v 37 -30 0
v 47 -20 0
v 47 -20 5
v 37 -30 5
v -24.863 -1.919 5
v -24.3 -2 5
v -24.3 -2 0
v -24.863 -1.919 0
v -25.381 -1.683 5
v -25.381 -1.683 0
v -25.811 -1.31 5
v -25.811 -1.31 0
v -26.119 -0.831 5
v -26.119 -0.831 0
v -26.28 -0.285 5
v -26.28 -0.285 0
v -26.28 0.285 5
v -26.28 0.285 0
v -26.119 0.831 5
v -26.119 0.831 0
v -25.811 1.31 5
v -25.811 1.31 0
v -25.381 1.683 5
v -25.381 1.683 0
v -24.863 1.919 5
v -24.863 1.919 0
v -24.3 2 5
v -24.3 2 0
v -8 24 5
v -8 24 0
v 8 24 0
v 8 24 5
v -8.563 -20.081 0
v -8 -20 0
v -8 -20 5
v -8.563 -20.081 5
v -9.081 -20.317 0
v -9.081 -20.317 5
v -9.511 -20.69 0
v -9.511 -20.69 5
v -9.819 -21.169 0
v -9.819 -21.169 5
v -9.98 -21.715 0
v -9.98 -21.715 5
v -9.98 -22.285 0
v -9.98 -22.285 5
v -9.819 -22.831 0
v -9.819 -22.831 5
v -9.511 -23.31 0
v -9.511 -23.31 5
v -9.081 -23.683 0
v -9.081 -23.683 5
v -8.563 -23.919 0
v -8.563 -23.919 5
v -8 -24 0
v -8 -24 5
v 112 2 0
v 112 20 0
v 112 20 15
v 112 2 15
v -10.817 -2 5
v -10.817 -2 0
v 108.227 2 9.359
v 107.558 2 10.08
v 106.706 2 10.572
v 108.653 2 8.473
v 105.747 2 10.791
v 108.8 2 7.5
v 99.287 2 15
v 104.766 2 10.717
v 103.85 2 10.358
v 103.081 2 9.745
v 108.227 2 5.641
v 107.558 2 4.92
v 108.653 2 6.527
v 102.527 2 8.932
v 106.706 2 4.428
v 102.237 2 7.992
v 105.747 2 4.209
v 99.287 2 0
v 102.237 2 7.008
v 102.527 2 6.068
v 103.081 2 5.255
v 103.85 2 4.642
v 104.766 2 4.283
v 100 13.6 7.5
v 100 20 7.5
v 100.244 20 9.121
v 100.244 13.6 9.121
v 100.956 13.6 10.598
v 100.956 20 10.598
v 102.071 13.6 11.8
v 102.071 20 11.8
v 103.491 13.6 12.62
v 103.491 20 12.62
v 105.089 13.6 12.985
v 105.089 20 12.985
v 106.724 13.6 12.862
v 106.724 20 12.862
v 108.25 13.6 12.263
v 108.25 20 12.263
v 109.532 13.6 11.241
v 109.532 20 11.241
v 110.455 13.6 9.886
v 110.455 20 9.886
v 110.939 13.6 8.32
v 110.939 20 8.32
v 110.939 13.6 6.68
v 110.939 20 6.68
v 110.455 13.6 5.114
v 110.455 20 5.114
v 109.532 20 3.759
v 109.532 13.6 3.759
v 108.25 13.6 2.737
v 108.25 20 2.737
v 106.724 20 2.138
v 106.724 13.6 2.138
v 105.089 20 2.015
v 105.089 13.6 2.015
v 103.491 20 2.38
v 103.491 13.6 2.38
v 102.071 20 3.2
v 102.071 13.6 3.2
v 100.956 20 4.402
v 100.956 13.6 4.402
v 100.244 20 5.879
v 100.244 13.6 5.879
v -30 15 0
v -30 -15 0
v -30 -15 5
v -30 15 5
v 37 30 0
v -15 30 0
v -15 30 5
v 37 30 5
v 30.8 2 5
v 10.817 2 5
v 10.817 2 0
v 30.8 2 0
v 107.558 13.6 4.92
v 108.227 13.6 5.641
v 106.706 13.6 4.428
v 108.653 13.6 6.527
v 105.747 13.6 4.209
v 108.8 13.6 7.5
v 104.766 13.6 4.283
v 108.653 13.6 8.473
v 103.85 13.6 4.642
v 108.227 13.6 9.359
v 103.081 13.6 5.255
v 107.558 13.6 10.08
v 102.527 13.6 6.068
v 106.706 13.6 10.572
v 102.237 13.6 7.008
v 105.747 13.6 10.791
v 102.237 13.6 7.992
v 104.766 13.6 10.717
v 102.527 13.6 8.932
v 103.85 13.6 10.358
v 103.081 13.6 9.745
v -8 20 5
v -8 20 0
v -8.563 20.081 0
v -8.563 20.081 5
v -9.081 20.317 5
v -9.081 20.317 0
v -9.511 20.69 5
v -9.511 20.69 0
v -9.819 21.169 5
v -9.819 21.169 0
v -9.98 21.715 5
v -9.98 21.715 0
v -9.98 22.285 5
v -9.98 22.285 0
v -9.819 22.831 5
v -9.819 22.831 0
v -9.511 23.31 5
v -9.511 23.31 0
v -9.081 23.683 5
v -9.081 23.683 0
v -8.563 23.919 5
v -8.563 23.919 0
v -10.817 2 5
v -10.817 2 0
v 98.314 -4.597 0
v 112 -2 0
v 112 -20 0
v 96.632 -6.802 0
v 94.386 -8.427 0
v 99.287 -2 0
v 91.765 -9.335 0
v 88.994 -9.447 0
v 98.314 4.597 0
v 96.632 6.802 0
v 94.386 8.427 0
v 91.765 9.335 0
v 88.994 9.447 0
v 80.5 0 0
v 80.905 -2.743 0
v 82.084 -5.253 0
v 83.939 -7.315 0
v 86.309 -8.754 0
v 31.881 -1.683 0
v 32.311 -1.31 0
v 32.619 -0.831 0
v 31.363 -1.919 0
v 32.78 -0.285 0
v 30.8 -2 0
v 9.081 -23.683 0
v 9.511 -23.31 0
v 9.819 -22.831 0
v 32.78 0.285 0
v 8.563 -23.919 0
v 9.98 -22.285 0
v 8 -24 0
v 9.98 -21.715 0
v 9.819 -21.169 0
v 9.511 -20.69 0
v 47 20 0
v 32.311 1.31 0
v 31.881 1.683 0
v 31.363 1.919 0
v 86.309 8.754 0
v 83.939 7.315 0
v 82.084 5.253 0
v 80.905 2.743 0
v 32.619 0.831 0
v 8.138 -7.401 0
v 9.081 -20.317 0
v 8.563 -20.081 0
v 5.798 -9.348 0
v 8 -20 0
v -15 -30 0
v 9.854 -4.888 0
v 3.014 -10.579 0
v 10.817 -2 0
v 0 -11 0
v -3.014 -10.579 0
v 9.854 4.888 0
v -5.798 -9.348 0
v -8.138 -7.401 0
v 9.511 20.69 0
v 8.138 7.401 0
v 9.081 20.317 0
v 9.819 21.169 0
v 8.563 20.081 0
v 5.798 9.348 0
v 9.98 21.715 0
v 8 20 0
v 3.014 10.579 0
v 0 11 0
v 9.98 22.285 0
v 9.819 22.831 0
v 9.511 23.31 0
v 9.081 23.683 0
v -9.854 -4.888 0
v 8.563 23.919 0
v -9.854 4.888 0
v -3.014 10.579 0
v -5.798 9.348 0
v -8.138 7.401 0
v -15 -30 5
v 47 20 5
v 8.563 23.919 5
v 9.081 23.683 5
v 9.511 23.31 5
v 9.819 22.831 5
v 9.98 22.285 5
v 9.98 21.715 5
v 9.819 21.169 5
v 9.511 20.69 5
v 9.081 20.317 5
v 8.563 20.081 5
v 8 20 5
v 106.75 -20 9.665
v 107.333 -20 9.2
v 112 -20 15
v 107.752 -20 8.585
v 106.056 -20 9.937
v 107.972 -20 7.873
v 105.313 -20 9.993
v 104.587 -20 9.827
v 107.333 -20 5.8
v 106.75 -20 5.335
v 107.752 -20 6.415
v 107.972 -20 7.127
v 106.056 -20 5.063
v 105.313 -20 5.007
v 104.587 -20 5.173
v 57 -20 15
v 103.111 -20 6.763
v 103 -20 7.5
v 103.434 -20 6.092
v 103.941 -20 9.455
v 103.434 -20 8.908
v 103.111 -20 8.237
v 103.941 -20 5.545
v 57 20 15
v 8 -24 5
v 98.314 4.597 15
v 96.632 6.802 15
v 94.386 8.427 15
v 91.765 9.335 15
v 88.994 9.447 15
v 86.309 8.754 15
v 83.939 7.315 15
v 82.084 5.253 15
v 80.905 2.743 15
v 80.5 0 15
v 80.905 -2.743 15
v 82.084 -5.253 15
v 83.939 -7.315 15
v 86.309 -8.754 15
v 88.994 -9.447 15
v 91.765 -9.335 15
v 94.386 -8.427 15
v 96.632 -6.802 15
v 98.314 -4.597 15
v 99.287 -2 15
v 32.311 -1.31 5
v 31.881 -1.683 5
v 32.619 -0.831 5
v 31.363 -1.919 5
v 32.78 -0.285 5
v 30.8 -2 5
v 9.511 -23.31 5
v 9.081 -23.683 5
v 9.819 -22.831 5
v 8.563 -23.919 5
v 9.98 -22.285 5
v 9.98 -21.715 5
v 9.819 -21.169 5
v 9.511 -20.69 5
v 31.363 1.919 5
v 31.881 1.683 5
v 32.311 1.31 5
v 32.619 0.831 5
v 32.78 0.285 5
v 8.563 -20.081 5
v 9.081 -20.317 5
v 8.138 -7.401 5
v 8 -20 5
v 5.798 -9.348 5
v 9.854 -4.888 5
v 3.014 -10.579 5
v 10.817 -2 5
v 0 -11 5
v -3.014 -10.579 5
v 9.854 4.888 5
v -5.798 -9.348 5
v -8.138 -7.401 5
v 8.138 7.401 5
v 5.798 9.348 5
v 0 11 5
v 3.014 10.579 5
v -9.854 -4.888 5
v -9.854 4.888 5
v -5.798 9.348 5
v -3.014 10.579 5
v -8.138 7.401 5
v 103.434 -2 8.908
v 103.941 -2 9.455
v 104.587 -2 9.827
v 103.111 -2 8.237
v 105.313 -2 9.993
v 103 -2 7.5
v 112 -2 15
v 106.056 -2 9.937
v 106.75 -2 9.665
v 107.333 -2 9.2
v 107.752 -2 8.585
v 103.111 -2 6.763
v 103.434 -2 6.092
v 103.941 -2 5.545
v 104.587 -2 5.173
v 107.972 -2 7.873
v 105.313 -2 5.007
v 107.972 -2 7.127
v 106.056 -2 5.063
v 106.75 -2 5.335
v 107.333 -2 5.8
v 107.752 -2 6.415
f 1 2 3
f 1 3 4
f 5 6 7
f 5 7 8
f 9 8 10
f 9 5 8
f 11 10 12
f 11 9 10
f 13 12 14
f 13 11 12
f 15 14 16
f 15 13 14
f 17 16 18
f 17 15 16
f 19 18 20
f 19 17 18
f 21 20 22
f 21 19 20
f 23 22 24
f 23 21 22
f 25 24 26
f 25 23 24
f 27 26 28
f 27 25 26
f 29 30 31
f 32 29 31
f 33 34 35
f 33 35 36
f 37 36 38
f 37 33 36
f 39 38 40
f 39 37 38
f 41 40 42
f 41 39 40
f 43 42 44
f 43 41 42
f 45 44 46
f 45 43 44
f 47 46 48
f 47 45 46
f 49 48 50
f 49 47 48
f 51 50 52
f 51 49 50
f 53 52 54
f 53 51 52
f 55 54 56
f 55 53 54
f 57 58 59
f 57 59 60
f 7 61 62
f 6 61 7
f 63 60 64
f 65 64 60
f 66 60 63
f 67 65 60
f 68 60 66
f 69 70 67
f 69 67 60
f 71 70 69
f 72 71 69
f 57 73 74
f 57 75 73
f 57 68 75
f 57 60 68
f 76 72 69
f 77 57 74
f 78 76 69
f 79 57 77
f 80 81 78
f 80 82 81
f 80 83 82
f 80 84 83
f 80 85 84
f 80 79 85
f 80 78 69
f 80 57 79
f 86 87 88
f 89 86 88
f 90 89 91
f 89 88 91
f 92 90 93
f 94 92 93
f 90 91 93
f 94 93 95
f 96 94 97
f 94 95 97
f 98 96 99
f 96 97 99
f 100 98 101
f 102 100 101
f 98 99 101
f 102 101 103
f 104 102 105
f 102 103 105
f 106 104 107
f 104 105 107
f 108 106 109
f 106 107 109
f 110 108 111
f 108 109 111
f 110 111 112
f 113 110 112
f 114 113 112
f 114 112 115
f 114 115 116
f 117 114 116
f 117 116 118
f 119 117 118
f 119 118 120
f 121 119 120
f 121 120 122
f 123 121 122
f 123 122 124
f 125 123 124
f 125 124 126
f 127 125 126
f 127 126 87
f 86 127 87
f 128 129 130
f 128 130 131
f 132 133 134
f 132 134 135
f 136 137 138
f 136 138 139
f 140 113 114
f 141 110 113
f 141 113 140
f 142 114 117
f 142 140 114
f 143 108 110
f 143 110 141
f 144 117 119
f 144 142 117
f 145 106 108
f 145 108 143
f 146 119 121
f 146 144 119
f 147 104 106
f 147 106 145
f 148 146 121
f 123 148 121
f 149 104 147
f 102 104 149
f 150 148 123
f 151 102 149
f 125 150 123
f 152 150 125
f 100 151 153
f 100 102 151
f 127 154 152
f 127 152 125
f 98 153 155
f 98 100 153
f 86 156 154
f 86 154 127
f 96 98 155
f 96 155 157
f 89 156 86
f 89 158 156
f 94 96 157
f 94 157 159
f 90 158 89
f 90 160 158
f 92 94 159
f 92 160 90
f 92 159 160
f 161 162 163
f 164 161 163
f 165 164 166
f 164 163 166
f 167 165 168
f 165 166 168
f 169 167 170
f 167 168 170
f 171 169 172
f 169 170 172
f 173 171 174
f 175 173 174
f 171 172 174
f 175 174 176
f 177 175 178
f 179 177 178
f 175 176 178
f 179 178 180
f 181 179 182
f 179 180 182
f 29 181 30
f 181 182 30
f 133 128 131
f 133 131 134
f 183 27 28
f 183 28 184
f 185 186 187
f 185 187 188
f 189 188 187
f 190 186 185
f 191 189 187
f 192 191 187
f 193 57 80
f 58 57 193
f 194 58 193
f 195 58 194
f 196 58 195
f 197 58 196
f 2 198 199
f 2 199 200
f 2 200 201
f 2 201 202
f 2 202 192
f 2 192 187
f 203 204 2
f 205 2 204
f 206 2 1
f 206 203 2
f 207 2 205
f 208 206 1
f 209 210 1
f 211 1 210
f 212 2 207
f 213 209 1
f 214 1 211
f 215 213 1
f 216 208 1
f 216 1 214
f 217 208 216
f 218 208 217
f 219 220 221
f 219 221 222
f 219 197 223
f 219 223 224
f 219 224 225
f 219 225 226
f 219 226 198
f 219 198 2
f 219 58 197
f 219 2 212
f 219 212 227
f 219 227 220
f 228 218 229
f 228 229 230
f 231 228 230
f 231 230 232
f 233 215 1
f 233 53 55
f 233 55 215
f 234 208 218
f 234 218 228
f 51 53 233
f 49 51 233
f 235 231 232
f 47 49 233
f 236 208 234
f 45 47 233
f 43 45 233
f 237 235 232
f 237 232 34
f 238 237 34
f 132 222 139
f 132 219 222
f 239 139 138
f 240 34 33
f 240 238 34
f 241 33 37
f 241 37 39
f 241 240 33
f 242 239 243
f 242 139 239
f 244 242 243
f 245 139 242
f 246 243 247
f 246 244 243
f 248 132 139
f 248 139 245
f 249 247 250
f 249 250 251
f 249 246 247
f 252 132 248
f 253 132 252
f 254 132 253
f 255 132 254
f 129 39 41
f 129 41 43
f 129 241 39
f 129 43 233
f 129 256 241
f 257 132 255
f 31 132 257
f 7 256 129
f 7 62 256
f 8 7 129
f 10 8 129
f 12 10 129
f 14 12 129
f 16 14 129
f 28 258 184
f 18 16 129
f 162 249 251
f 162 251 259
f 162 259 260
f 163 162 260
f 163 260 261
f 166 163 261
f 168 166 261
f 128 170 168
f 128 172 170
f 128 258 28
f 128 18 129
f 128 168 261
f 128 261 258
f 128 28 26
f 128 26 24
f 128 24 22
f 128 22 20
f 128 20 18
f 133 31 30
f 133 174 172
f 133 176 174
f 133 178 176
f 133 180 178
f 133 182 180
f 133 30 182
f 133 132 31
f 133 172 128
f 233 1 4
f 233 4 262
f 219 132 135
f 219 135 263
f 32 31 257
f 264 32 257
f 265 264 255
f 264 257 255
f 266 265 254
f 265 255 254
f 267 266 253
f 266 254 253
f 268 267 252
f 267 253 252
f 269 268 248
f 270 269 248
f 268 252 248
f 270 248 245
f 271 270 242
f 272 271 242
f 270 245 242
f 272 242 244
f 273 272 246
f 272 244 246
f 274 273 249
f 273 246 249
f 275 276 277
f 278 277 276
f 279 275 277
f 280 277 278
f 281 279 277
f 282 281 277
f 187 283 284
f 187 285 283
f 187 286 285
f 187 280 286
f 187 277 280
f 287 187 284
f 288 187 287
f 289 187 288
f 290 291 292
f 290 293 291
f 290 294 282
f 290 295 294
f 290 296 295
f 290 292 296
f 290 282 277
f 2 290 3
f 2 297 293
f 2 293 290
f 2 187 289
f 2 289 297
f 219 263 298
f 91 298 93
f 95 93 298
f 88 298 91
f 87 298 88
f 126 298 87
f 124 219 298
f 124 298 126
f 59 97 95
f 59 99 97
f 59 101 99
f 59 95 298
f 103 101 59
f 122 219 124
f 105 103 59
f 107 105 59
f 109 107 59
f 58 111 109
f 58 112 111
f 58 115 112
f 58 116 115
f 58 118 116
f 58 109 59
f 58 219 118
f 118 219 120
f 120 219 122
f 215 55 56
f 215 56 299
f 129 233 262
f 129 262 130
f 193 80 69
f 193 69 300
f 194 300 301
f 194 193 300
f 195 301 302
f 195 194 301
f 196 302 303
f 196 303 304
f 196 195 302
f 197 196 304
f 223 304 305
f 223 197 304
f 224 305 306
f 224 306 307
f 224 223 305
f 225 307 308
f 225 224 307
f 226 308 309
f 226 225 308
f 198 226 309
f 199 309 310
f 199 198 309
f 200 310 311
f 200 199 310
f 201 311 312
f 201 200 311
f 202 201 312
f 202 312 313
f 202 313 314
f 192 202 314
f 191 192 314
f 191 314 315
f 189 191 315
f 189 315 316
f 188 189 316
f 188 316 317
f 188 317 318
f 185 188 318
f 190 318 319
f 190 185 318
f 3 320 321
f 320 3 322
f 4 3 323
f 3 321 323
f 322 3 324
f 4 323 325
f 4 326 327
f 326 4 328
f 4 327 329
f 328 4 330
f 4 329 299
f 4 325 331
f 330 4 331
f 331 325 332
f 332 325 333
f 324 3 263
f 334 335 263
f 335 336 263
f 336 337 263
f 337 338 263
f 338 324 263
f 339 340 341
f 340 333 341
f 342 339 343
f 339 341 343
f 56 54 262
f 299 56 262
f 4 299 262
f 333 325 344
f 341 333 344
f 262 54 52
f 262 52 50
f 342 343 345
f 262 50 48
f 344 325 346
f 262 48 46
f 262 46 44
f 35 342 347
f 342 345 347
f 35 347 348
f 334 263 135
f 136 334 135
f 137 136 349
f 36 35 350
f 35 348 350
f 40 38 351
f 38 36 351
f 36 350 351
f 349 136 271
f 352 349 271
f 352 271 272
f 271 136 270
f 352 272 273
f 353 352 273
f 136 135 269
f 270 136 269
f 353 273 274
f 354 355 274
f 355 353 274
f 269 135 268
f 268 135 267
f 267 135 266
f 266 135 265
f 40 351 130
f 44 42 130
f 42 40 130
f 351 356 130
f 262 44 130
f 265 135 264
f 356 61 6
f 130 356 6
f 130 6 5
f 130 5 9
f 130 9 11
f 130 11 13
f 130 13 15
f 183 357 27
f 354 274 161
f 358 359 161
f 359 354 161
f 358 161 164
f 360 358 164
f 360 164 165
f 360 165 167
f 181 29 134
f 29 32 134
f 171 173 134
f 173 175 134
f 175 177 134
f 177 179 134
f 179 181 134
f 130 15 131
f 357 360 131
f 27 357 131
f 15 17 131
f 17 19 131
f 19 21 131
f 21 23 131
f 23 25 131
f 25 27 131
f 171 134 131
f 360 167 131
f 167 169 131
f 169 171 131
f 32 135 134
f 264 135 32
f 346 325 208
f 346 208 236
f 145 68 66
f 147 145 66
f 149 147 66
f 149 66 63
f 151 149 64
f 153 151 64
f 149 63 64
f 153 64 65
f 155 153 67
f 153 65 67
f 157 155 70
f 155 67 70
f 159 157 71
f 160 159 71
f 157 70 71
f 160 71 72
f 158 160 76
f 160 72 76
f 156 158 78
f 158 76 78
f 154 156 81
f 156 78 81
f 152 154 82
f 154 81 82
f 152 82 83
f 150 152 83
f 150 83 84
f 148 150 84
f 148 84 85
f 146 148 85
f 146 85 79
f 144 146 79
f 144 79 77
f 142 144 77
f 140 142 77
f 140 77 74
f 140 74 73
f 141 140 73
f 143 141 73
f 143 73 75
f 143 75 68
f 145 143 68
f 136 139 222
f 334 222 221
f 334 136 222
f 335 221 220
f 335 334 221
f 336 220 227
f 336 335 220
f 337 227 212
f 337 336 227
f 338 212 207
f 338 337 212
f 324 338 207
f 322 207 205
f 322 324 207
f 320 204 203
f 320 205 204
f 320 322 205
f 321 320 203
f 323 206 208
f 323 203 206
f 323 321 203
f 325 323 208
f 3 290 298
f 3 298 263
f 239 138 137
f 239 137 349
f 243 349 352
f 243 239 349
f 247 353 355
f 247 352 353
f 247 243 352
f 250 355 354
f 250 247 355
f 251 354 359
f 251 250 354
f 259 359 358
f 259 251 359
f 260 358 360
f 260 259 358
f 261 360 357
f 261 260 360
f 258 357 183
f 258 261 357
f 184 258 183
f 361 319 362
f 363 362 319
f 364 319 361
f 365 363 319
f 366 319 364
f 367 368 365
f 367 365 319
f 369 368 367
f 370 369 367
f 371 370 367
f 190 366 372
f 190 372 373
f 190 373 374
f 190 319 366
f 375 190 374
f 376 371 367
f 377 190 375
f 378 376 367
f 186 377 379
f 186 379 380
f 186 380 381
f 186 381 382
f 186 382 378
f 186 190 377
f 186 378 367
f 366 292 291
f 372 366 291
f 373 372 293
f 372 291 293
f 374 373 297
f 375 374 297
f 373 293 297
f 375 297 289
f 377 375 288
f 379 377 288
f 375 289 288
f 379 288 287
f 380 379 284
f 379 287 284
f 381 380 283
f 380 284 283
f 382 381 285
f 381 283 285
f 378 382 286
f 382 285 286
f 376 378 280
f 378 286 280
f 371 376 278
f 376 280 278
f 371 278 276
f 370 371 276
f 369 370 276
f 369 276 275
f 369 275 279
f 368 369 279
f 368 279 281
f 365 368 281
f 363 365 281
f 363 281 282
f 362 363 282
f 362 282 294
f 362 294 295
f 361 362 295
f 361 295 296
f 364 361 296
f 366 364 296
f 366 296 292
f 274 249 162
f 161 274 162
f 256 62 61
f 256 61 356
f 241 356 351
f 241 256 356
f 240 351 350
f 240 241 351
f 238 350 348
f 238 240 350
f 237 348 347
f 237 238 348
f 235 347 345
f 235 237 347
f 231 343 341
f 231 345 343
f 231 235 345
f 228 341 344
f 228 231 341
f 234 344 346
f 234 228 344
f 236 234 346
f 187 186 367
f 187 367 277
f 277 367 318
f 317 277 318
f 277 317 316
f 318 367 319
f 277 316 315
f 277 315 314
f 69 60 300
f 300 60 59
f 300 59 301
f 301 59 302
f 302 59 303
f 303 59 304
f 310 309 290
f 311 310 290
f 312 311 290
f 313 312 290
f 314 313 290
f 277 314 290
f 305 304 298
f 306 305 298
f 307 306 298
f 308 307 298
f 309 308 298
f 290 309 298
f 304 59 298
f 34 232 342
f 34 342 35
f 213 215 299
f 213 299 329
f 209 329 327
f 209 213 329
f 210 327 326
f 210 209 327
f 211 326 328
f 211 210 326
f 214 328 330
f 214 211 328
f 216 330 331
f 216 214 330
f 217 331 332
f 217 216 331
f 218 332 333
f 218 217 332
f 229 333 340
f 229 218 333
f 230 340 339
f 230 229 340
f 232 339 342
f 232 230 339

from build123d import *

# Parameters (mm, degrees)
ESQUISSE1_R                                        = 11
BOSS_EXTRU_1_DEPTH                                 = 15
CHAMBRAGE_POUR_VIS_T_TE_HEXAGONALE_M61_D           = 6.6
CHAMBRAGE_POUR_VIS_T_TE_HEXAGONALE_M61_DEPTH       = 18
CHAMBRAGE_POUR_VIS_T_TE_HEXAGONALE_M61_CBORE_D     = 11
CHAMBRAGE_POUR_VIS_T_TE_HEXAGONALE_M61_CBORE_DEPTH = 6.4
ENL_V_MAT_EXTRU_7_DEPTH                            = 91
TROU_TARAUD_M61_D                                  = 5
ENL_V_MAT_EXTRU_8_DEPTH                            = 6


with BuildPart() as part:
    # Esquisse1 → Boss.-Extru.1 (new body)
    with BuildSketch(Plane.XY):
        with BuildLine():
            Line((37, 30), (47, 20))
            Line((47, 20), (112, 20))
            Line((112, 20), (112, 2))
            Line((112, 2), (99.287087811, 2))
            ThreePointArc((99.287087811, 2), (80.5, 0), (99.287087811, -2))
            Line((99.287087811, -2), (112, -2))
            Line((112, -2), (112, -20))
            Line((112, -20), (47, -20))
            Line((47, -20), (37, -30))
            Line((37, -30), (-15, -30))
            Line((-15, -30), (-30, -15))
            Line((-30, -15), (-30, 15))
            Line((-30, 15), (-15, 30))
            Line((-15, 30), (37, 30))
        make_face()
        Circle(ESQUISSE1_R, mode=Mode.SUBTRACT)
        with BuildLine():
            Line((-8, 24), (8, 24))
            ThreePointArc((8, 24), (10, 22), (8, 20))
            Line((8, 20), (-8, 20))
            ThreePointArc((-8, 20), (-10, 22), (-8, 24))
        make_face(mode=Mode.SUBTRACT)
        with BuildLine():
            Line((-8, -24), (8, -24))
            ThreePointArc((8, -24), (10, -22), (8, -20))
            Line((8, -20), (-8, -20))
            ThreePointArc((-8, -20), (-10, -22), (-8, -24))
        make_face(mode=Mode.SUBTRACT)
    extrude(amount=BOSS_EXTRU_1_DEPTH)

    # Chambrage pour vis à tête hexagonale M61
    with Locations(Plane(origin=(0, 20, 0), x_dir=(-1, 0, 0), z_dir=(0, 1, 0))):
        with Locations((-105.5, 7.5)):
            CounterBoreHole(CHAMBRAGE_POUR_VIS_T_TE_HEXAGONALE_M61_D / 2, CHAMBRAGE_POUR_VIS_T_TE_HEXAGONALE_M61_CBORE_D / 2, CHAMBRAGE_POUR_VIS_T_TE_HEXAGONALE_M61_CBORE_DEPTH, depth=CHAMBRAGE_POUR_VIS_T_TE_HEXAGONALE_M61_DEPTH)

    # Esquisse4 → Enlèv. mat.-Extru.7 (cut, through all)
    with BuildSketch(Plane(origin=(0, 60, 0), x_dir=(1, 0, 0), z_dir=(0, 1, 0))):
        Polygon((47, -5), (-30, -5), (-30, -38.86865167), (80.86865167, -38.86865167), align=None)
    extrude(amount=-ENL_V_MAT_EXTRU_7_DEPTH, mode=Mode.SUBTRACT)

    # Trou taraudé M61 (through all)
    with Locations(Plane(origin=(0, -2, 0), x_dir=(1, 0, 0), z_dir=(0, 1, 0))):
        with Locations((105.5, -7.5)):
            Hole(TROU_TARAUD_M61_D / 2)

    # Esquisse7 → Enlèv. mat.-Extru.8 (cut, through all)
    with BuildSketch(Plane.XY.offset(5)):
        with BuildLine():
            Line((-24.3, 2), (-6.3, 2))
            ThreePointArc((-6.3, 2), (-4.3, 0), (-6.3, -2))
            Line((-6.3, -2), (-24.3, -2))
            ThreePointArc((-24.3, -2), (-26.3, 0), (-24.3, 2))
        make_face()
        with BuildLine():
            Line((8.8, 2), (30.8, 2))
            ThreePointArc((30.8, 2), (32.8, 0), (30.8, -2))
            Line((30.8, -2), (8.8, -2))
            ThreePointArc((8.8, -2), (6.8, 0), (8.8, 2))
        make_face()
    extrude(amount=-ENL_V_MAT_EXTRU_8_DEPTH, mode=Mode.SUBTRACT)


solid = part.part
